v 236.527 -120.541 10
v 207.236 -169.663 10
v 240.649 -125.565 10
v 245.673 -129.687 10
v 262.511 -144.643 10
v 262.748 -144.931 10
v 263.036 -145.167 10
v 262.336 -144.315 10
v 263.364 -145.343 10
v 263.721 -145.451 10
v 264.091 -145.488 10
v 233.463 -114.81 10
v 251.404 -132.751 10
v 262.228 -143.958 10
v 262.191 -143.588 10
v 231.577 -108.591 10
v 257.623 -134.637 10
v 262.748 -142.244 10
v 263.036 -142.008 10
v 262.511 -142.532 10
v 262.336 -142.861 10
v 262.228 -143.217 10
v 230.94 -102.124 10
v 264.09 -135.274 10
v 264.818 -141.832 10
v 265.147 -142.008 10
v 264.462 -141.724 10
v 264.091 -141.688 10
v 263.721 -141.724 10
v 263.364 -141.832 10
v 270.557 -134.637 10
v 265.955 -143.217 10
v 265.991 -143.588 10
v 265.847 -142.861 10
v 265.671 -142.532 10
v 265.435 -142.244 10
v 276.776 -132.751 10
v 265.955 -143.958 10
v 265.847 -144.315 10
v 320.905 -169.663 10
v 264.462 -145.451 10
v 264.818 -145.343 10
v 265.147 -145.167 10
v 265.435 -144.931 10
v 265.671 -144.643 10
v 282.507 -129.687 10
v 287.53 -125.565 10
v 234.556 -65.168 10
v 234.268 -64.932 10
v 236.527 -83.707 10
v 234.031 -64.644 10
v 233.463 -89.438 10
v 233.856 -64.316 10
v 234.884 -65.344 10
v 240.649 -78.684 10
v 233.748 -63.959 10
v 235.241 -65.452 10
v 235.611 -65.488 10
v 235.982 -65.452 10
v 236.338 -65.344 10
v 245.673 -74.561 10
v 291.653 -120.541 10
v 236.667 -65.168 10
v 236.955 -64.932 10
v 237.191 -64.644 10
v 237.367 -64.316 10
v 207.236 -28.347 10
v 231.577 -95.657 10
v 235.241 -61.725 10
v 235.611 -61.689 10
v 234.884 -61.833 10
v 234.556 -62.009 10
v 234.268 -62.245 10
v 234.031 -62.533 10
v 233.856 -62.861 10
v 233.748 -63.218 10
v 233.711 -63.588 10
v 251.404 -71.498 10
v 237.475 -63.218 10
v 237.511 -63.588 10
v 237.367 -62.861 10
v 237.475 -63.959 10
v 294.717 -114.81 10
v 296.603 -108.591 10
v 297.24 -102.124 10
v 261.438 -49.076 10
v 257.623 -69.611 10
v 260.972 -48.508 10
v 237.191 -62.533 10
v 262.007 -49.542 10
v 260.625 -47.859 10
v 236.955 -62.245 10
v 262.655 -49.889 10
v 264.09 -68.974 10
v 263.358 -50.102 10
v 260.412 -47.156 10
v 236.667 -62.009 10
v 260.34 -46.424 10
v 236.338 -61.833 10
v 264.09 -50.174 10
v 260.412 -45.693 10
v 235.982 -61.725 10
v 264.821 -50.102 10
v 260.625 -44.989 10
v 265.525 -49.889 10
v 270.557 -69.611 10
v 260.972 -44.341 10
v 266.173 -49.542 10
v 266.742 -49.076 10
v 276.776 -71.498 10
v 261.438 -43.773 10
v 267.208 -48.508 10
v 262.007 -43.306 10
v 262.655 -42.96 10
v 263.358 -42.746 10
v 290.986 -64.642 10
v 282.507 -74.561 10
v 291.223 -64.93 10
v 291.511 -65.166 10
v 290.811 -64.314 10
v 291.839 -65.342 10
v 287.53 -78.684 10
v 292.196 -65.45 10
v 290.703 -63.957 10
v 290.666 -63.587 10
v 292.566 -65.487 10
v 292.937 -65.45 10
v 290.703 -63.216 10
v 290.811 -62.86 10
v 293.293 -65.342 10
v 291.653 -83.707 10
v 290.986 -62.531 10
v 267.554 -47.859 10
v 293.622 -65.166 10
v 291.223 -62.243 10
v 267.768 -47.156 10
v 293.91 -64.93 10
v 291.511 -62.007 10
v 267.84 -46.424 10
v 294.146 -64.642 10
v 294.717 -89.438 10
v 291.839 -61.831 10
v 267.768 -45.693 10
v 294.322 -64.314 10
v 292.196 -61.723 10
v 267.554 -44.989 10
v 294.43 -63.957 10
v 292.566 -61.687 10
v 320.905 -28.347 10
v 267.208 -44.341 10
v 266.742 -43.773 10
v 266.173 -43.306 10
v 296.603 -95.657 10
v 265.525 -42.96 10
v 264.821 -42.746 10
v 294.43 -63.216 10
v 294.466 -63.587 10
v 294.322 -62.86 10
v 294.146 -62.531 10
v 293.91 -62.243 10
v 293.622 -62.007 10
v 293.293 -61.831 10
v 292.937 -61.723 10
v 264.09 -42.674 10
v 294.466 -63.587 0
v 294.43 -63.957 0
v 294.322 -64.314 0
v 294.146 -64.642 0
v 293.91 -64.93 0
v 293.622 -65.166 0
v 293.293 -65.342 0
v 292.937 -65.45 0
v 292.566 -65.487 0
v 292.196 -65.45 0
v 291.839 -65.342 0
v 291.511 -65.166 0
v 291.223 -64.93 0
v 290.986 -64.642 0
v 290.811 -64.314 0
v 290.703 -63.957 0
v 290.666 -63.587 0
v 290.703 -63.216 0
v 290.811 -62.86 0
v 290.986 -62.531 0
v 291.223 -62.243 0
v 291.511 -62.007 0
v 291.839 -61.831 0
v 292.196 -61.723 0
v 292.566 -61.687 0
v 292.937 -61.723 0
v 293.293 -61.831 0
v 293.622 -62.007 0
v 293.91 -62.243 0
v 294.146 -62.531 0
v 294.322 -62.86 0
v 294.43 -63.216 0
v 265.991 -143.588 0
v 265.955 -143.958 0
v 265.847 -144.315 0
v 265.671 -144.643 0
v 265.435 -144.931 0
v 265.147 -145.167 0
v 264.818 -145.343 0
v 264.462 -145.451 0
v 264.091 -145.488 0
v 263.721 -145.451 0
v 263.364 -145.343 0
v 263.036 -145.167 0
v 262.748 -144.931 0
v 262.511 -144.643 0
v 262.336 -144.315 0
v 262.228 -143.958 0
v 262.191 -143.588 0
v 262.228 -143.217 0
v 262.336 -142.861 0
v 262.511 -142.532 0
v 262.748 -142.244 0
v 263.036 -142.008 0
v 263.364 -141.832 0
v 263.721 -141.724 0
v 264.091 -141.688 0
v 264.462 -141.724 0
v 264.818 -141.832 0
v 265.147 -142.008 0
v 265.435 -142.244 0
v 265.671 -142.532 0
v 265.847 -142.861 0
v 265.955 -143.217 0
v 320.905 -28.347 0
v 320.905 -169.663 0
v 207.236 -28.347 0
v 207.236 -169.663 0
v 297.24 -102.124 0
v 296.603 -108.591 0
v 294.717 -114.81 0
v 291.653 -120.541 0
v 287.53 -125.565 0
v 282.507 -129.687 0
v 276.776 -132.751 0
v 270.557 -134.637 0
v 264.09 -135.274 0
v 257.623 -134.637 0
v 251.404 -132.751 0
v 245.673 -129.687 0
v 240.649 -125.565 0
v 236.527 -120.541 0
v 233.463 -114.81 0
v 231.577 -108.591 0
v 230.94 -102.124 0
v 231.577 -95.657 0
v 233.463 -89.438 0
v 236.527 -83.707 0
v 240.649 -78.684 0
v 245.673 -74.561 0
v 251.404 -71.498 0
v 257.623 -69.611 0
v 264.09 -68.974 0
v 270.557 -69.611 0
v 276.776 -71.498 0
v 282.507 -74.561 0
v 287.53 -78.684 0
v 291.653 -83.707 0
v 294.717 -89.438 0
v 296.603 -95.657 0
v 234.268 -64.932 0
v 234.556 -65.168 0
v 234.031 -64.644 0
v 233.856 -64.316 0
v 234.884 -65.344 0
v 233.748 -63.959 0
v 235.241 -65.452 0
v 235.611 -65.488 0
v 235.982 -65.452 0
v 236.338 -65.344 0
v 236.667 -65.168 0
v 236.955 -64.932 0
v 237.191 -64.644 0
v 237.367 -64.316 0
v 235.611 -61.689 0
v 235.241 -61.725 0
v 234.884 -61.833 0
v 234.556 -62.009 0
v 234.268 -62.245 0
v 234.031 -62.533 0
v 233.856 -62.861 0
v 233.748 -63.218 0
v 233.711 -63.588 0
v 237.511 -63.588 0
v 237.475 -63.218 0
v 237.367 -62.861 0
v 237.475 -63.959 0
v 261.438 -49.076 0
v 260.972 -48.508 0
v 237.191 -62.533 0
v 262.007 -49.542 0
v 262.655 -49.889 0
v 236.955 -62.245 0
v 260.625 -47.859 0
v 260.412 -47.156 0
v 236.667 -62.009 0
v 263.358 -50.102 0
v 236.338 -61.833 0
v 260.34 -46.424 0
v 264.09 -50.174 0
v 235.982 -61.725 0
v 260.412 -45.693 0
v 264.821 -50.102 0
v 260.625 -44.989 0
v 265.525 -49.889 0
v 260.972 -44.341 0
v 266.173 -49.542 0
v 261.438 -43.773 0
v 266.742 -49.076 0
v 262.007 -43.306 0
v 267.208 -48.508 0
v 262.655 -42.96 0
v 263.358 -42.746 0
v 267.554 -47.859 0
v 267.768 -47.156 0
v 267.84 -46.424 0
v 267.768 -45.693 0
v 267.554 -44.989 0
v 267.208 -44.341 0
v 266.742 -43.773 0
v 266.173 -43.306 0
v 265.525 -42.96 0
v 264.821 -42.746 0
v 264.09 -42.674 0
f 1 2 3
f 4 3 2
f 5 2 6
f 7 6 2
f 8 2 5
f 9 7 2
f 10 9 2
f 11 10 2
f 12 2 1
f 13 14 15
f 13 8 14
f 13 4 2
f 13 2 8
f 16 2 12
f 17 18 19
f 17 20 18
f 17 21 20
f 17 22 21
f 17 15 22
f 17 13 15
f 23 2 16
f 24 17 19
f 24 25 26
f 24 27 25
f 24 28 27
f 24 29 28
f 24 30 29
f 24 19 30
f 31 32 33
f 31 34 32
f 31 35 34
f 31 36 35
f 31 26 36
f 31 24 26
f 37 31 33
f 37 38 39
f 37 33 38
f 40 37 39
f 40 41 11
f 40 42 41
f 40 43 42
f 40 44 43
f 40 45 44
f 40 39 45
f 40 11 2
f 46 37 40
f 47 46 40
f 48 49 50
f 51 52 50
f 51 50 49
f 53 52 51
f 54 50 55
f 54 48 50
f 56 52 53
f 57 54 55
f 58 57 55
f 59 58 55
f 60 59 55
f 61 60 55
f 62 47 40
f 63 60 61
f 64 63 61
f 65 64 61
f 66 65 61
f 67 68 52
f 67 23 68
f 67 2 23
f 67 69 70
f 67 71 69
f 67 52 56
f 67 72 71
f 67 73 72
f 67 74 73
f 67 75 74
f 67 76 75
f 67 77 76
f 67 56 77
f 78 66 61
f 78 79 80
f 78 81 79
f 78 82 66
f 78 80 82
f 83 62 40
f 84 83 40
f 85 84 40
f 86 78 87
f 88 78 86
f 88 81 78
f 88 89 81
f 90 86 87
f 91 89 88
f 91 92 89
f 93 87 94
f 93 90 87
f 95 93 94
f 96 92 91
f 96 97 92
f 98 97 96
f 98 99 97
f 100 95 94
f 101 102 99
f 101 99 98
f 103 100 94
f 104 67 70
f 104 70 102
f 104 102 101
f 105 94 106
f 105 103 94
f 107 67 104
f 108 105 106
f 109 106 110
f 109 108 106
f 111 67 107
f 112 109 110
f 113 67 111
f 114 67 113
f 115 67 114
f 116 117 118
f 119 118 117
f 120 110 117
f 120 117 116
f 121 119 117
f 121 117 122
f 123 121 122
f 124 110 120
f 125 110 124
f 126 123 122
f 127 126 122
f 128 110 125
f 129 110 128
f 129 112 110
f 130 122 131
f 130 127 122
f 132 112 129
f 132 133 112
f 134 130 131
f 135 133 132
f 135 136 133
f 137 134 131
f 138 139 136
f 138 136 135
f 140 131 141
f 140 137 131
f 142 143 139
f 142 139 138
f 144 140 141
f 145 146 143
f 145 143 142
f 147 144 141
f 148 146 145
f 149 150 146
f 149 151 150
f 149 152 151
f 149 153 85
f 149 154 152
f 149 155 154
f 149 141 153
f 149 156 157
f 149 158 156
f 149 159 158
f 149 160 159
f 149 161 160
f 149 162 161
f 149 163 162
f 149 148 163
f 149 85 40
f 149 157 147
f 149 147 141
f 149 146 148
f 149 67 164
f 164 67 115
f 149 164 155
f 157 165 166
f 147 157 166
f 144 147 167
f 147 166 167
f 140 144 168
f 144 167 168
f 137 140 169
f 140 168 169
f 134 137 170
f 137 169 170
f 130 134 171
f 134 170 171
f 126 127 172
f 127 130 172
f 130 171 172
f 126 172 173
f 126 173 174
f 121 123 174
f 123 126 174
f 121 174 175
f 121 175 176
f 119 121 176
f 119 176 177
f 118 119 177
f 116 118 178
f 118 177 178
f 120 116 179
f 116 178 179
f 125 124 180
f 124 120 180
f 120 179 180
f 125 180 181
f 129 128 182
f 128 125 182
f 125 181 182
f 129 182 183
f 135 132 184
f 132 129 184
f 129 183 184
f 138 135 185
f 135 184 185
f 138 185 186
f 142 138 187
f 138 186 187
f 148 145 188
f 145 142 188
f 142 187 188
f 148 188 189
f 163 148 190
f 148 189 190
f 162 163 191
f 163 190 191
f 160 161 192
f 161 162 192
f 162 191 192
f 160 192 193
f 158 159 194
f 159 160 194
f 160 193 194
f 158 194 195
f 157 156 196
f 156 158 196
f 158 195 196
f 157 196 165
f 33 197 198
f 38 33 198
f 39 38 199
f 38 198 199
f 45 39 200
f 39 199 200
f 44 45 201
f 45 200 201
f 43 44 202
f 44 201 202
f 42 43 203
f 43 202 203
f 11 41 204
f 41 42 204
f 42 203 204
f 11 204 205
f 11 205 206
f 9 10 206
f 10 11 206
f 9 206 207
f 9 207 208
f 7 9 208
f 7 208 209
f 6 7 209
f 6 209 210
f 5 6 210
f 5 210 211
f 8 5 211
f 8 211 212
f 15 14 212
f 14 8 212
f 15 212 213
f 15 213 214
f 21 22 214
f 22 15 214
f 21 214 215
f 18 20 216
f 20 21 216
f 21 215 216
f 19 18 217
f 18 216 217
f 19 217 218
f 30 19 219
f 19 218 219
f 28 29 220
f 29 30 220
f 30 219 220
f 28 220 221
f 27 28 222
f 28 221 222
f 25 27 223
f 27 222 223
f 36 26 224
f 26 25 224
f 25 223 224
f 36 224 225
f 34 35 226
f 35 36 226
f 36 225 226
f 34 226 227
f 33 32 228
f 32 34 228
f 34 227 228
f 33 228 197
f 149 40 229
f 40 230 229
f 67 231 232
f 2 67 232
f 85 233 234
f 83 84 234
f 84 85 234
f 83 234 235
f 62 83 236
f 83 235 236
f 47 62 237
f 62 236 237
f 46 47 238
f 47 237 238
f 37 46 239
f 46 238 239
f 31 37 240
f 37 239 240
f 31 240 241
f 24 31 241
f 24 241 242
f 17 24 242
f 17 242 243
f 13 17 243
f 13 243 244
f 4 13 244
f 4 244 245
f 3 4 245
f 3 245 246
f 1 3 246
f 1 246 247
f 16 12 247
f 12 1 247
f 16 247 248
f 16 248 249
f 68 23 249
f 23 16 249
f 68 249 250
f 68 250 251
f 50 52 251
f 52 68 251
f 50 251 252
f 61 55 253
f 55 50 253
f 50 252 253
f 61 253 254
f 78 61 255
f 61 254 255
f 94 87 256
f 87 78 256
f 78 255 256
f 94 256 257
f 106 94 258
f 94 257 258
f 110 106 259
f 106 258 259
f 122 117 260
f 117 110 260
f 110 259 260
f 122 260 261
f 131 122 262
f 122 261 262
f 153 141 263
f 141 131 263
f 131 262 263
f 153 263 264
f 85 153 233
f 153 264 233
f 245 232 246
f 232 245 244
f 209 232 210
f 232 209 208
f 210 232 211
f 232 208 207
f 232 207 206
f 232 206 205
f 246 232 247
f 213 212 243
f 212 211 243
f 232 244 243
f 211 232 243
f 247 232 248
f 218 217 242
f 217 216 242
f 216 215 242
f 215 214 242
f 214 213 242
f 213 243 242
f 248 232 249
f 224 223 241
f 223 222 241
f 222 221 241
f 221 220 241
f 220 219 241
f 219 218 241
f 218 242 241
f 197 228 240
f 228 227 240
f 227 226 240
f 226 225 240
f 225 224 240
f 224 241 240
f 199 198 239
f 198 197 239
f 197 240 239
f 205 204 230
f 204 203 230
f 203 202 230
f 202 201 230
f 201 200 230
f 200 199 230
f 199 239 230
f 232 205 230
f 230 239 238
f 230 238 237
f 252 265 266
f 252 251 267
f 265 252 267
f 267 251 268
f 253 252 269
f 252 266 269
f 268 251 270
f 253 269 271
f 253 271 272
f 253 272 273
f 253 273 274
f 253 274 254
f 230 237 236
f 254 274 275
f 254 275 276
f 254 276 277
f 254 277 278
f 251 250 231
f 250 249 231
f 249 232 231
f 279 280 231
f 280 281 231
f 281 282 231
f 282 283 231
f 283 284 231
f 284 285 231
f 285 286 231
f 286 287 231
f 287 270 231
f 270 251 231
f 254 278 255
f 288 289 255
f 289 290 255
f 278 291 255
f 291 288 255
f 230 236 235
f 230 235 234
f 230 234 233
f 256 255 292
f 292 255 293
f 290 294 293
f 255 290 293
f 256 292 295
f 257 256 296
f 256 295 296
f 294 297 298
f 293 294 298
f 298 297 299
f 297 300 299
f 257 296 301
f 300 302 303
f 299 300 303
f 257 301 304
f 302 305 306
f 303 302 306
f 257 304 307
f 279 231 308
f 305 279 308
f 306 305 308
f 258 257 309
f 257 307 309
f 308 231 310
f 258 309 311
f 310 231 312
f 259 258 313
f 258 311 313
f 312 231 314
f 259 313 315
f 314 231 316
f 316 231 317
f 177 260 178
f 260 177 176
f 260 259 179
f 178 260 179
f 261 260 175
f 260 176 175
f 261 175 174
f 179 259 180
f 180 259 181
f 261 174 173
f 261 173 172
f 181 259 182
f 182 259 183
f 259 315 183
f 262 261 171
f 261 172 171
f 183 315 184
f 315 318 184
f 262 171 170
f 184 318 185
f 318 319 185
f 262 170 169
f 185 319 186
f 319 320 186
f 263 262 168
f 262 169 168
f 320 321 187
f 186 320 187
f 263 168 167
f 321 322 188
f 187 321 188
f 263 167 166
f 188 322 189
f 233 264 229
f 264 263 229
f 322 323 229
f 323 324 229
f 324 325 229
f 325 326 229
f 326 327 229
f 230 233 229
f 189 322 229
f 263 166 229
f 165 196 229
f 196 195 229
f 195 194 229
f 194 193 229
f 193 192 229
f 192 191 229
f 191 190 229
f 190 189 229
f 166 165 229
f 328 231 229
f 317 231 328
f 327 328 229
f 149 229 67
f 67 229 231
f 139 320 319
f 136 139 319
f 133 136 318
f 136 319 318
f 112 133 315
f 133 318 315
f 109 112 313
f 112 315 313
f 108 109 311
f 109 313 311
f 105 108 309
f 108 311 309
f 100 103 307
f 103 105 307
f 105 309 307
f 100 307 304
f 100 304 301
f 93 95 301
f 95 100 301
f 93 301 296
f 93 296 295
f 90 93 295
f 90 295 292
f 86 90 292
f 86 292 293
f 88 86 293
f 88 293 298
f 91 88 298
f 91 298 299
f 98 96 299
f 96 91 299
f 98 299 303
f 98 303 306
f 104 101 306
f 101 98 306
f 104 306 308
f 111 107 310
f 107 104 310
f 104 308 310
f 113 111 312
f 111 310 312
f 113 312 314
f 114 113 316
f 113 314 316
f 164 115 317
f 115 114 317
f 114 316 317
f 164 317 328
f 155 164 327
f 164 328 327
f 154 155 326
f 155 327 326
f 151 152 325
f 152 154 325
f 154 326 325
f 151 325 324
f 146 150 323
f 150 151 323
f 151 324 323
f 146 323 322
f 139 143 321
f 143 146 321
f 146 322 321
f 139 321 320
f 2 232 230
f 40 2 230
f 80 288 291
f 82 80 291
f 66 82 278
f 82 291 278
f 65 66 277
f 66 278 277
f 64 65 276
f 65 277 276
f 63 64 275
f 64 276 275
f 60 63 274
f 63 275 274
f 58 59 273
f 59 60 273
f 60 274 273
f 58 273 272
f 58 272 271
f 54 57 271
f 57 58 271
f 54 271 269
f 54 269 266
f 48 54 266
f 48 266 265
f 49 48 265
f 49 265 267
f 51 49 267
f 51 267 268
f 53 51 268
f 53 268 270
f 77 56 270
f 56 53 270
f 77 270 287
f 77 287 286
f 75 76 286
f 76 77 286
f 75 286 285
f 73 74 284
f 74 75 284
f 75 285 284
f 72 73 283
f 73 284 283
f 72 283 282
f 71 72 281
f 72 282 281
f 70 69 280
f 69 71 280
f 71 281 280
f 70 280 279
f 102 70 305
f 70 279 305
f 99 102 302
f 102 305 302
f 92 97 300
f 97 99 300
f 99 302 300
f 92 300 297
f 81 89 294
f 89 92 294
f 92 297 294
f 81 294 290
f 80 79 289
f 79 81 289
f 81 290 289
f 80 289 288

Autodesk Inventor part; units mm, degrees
ref_plane "YZ Plane" through (0, 0, 0) normal (1, 0, 0) x (0, 1, 0)
ref_plane "XZ Plane" through (0, 0, 0) normal (0, 1, 0) x (-1, 0, 0)
ref_plane "XY Plane" through (0, 0, 0) normal (0, 0, 1) x (1, 0, 0)
sketch "스케치4" plane through (0, 0, 0) normal (0, 0, 1) x (1, 0, 0)
  circle A0 centre (264.0912, 143.5876) radius 1.9
  circle A1 centre (235.6112, 63.5885) radius 1.9
  circle A2 centre (292.5662, 63.5867) radius 1.9
  circle A3 centre (264.0899, 46.4242) radius 3.75
  circle A4 centre (264.0899, 102.1242) radius 33.15
  circle A5 centre (292.5662, 63.5867) radius 1.5
  circle A6 centre (235.6112, 63.5885) radius 1.5
  circle A7 centre (264.0912, 143.5876) radius 1.5
  line L0 (264.0899, 102.1242) -> (264.0899, 46.4242)
  line L1 (356.232, 0) -> (158.7026, 0)
  circle A8 centre (264.0912, -143.5876) radius 1.9
  circle A9 centre (235.6112, -63.5885) radius 1.9
  circle A10 centre (292.5662, -63.5867) radius 1.9
  circle A11 centre (264.0899, -46.4242) radius 3.75
  circle A12 centre (264.0899, -102.1242) radius 33.15
  circle A13 centre (235.6112, -63.5885) radius 1.5
  circle A14 centre (264.0912, -143.5876) radius 1.5
  circle A15 centre (292.5662, -63.5867) radius 1.5
  line L2 (264.0899, -102.1242) -> (264.0899, -46.4242) construction
  line L3 (320.9052, -28.3469) -> (207.2359, -28.3469)
  line L4 (207.2359, -28.3469) -> (207.2359, -169.6626)
  line L5 (207.2359, -169.6626) -> (320.9052, -169.6626)
  line L6 (320.9052, -169.6626) -> (320.9052, -28.3469)
  point P0 (0, 0)
  dimension "d38" = 3
  dimension "d39" = 3
  dimension "d40" = 3
  dimension "d41" = 41.4634
  dimension "d42" = 47.917
  dimension "d45" = 7.5
  dimension "d48" = 143.537
  dimension "d50" = 47.917
  dimension "d51" = 36.465
  dimension "d52" = 36.462
  dimension "d53" = 179.998
  dimension "d54" = 55.7
extrude "돌출3" add sketch "스케치4" along normal blind 10 contours L6 L5 L4 L3
properties part number "Lidar"
